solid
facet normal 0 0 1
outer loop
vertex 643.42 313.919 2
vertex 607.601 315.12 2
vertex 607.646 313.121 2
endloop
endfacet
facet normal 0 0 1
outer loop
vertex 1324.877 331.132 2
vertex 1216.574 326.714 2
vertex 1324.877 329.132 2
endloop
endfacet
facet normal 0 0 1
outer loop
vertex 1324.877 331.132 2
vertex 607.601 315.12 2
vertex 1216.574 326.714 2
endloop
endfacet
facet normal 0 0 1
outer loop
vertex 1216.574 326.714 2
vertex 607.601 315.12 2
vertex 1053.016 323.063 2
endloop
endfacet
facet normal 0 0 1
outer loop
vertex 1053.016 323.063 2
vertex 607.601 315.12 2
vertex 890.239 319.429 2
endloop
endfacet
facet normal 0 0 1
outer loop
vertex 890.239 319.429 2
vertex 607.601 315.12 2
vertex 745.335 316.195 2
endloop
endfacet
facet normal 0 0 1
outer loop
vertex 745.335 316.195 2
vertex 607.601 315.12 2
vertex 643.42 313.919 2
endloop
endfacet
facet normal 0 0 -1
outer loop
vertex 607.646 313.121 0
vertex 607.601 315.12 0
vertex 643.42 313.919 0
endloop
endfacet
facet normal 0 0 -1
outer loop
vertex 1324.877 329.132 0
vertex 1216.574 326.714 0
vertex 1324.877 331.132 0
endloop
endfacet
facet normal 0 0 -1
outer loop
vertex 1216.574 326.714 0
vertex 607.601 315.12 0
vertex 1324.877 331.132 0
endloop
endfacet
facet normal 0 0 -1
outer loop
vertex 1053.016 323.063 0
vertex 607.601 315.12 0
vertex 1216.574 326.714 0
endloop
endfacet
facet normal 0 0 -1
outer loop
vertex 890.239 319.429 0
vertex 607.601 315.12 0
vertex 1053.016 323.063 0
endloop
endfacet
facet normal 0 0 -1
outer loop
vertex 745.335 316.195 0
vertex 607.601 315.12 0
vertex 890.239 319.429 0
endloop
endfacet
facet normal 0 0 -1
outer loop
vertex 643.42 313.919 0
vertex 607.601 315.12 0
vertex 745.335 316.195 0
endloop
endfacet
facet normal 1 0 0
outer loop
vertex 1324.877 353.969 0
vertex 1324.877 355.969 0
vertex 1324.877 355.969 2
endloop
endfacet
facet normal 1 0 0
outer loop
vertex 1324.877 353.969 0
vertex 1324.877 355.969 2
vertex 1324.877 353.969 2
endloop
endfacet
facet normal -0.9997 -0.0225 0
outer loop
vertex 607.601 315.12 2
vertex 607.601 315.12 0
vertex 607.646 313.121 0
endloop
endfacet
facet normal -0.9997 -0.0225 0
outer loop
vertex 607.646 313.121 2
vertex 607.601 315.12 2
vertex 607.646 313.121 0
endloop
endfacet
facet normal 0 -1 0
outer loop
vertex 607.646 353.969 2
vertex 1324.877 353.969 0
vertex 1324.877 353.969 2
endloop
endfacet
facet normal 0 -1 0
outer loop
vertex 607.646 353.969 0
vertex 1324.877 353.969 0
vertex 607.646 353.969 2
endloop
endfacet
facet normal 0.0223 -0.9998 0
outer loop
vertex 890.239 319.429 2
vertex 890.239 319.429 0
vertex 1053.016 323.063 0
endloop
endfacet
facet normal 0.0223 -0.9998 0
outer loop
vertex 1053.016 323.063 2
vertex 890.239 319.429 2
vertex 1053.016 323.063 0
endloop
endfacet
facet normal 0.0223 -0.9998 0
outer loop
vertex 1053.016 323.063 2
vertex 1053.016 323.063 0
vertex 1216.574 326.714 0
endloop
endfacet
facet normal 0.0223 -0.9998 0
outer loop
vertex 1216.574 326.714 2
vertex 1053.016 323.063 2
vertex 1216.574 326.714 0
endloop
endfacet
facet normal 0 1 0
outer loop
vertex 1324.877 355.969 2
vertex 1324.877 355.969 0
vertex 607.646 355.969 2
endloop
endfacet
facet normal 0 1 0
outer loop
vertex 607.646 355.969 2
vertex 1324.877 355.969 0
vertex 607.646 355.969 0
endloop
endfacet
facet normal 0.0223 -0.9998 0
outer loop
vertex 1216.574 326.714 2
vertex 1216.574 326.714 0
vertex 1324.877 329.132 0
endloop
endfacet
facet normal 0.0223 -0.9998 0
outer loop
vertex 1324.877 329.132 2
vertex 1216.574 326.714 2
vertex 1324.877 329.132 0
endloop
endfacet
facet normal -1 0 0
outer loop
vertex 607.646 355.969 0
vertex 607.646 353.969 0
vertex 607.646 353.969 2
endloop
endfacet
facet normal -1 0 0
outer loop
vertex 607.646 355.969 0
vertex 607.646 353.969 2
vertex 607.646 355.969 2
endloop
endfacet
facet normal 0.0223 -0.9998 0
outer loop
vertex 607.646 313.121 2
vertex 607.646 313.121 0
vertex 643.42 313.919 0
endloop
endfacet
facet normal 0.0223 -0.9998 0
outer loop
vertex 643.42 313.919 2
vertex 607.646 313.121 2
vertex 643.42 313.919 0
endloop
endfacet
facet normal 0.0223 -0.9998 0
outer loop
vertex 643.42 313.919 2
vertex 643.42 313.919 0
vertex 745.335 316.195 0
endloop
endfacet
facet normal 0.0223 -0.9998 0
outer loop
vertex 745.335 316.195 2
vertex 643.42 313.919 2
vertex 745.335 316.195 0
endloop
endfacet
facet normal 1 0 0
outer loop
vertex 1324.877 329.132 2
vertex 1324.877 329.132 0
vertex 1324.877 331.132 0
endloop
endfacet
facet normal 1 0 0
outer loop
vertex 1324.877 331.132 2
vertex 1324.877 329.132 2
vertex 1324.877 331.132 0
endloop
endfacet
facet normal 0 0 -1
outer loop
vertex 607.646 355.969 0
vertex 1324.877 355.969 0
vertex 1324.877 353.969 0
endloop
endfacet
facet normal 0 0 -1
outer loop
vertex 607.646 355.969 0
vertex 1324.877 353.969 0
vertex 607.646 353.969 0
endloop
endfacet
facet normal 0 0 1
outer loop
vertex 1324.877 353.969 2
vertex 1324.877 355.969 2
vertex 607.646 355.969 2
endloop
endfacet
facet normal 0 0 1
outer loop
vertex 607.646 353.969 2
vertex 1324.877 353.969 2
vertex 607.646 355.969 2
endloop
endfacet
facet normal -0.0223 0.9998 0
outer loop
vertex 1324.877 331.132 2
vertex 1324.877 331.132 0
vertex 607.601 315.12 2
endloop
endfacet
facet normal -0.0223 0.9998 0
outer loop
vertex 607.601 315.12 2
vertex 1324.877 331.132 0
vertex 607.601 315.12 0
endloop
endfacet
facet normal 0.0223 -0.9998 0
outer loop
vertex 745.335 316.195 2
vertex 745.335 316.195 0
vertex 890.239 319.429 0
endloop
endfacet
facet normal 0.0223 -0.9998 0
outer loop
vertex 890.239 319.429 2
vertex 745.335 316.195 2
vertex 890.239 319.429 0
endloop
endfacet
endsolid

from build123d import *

# Parameters (mm, degrees)
EXTRUDE_1_DEPTH   = 2
EXTRUDE_1_2_DEPTH = 2


with BuildPart() as part:
    # Model → 凸台-拉伸1 (new body)
    with BuildSketch(Plane.XY):
        Polygon((607.645617518, 355.968593343), (643.420272899, 355.968593343), (745.335428769, 355.968593343), (890.239047675, 355.968593343), (1053.01641336, 355.968593343), (1216.574493693, 355.968593343), (1324.877179039, 355.968593343), (1324.877179039, 353.968593343), (607.645617518, 353.968593343), align=None)
    extrude(amount=EXTRUDE_1_DEPTH)


with BuildPart() as body_2:
    # Model → Extrude 1 2 (new body)
    with BuildSketch(Plane.XY):
        Polygon((607.645617518, 313.120827579), (643.420272899, 313.919448523), (745.335428769, 316.194566835), (890.239047675, 319.429344567), (1053.01641336, 323.063130046), (1216.574493693, 326.714343704), (1324.877179039, 329.132055156), (1324.877179039, 331.132055156), (607.600982724, 315.12032945), align=None)
    extrude(amount=EXTRUDE_1_2_DEPTH)


solid = Compound([part.part, body_2.part])
